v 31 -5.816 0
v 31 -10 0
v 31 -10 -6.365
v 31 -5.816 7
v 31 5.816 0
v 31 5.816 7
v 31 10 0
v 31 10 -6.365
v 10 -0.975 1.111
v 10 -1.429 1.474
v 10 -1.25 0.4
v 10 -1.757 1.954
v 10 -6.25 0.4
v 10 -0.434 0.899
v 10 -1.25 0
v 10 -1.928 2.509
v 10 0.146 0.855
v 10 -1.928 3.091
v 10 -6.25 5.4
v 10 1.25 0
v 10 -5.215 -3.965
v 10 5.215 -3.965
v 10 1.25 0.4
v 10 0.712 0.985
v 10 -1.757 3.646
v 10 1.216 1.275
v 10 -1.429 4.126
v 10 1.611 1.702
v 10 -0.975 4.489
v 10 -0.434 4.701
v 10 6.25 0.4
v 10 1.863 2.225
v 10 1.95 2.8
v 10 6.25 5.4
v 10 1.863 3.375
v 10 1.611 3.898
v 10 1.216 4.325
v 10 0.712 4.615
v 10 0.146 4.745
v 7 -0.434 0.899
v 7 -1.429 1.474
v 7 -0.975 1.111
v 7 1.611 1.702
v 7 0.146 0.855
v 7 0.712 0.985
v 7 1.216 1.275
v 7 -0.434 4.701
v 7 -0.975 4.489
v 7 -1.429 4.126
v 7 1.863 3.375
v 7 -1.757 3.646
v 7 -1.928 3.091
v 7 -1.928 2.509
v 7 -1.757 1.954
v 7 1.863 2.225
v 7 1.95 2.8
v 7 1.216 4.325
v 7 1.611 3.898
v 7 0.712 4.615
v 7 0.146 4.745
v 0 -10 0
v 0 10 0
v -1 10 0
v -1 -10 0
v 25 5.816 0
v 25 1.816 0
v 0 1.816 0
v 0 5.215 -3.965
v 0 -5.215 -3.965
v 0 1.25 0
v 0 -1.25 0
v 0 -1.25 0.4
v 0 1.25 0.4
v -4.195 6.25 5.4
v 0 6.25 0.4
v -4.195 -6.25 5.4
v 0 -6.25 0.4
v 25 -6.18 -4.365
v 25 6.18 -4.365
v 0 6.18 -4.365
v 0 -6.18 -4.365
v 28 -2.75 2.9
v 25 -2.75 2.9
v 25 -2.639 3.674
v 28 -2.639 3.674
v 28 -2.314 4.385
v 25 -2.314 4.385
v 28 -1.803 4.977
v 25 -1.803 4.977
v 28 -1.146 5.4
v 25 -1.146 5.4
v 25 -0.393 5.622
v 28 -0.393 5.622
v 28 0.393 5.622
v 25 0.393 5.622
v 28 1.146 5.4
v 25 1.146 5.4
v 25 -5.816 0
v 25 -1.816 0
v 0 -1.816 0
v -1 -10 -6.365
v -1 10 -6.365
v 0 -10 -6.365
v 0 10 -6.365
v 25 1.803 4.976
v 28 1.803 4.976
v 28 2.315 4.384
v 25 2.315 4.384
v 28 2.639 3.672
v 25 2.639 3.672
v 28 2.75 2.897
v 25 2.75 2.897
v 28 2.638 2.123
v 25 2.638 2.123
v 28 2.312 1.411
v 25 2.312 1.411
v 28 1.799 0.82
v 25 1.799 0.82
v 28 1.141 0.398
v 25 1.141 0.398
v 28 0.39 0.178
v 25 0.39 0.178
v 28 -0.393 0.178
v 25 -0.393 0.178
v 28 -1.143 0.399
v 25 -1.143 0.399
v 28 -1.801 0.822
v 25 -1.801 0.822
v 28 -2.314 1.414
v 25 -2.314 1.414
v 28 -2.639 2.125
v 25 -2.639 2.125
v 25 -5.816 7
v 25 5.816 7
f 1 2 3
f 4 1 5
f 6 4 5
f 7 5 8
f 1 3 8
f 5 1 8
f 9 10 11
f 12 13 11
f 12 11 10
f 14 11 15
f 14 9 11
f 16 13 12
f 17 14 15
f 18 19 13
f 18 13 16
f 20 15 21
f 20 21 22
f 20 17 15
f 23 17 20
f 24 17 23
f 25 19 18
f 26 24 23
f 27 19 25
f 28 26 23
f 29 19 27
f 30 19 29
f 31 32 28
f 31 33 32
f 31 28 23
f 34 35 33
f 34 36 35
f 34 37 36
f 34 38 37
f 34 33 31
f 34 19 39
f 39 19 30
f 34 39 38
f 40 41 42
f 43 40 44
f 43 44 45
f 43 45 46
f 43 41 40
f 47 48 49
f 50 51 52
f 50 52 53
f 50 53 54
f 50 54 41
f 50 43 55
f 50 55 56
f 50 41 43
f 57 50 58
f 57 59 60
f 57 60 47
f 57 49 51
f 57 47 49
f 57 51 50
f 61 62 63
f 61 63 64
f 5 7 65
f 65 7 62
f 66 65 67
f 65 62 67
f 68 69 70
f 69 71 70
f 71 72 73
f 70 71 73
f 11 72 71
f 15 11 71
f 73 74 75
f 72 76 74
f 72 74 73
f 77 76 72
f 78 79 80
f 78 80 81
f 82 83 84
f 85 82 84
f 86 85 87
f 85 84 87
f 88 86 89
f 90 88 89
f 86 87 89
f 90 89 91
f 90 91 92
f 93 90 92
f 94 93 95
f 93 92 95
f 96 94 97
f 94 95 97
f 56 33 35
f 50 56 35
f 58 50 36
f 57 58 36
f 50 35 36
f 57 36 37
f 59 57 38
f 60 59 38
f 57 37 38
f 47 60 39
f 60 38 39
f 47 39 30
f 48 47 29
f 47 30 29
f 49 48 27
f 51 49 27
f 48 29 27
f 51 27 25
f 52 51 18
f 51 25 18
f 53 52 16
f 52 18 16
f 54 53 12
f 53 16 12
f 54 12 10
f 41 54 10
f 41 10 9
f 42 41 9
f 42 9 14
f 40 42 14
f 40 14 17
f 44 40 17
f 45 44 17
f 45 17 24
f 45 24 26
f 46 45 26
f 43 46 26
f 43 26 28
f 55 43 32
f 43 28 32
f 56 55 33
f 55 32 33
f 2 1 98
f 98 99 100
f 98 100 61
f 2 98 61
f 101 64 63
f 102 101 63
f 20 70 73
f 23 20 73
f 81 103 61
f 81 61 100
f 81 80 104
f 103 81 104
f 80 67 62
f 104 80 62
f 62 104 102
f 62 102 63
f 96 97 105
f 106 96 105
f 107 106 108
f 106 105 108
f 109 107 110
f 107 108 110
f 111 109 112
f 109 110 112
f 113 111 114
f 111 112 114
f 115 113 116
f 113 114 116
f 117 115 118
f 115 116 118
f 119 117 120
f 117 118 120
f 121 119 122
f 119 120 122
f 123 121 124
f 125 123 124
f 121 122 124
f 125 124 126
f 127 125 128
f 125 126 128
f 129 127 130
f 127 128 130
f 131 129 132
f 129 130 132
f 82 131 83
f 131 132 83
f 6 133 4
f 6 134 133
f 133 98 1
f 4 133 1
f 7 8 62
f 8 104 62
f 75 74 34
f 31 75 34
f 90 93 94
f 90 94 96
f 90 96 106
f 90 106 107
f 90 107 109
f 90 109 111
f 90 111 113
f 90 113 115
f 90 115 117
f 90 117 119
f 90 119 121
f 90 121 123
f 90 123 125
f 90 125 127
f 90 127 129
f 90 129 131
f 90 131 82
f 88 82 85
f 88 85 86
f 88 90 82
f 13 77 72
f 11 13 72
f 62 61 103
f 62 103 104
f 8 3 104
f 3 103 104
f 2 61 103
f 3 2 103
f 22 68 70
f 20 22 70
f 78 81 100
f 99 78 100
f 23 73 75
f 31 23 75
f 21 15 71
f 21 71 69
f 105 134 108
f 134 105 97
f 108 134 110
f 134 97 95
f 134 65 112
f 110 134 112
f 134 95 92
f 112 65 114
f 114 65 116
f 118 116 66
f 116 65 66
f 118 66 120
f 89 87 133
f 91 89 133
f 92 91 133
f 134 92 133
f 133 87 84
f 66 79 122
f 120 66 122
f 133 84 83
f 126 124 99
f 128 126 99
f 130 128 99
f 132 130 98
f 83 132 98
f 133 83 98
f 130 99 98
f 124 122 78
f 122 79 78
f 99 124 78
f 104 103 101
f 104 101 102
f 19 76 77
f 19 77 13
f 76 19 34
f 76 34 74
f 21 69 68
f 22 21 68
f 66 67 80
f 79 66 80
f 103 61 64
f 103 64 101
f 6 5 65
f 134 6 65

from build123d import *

# Parameters (mm, degrees)
F2_DEPTH  = 25
F3_DEPTH  = 10
F5_DEPTH  = 12.5
F7_DEPTH  = 6
F9_DEPTH  = 7
F11_DEPTH = 3
F12_R     = 1.95
F12_R_2   = 1
F13_DEPTH = 3
F15_DEPTH = 1


# Not quite as in the source:
# - a feature names something its author has since deleted; it is built from what else it names


with BuildPart() as f2:
    # F1 (on Right) → F2 (new body)
    with BuildSketch(Plane.YZ):
        Polygon((10, -6.3646009103), (10, 0), (1.8156854249, 0), (6.1802863352, -4.3646009103), (0, -4.3646009103), (-6.1802863352, -4.3646009103), (-1.8156854249, 0), (-10, 0), (-10, -6.3646009103), (0, -6.3646009103), align=None)
    extrude(amount=F2_DEPTH)

    # F6 (on face) → F7 (join)
    with BuildSketch(Plane.YZ.offset(25)):
        Polygon((-6.1802863352, -4.3646009103), (-1.8156854249, 0), (-10, 0), (-10, -6.3646009103), (10, -6.3646009103), (10, 0), (1.8156854249, 0), (6.1802863352, -4.3646009103), align=None)
        Polygon((1.8156854249, 0), (-1.8156854249, 0), (-6.1802863352, -4.3646009103), (6.1802863352, -4.3646009103), align=None)
    extrude(amount=F7_DEPTH)

    # F8 (on face) → F9 (join)
    with BuildSketch(Plane.XY):
        Polygon((25, 1.8156854249), (25, -1.8156854249), (25, -5.8156854249), (31, -5.8156854249), (31, 5.8156854249), (25, 5.8156854249), align=None)
    extrude(amount=F9_DEPTH)

    # F10 (on face) → F11 (cut)
    with BuildSketch(Plane(origin=(25, 0, 0), x_dir=(0, -1, 0), z_dir=(-1, 0, 0))):
        with BuildLine():
            ThreePointArc((1.1456439237, 5.4), (0, 5.65), (-1.1456439237, 5.4))
            Line((-1.1456439237, 5.4), (1.1456439237, 5.4))
        make_face()
        with BuildLine():
            Line((1.1456439237, 5.4), (-1.1456439237, 5.4))
            ThreePointArc((-1.1456439237, 5.4), (-1.4852574204, 0.585586382), (2.75, 2.9))
            ThreePointArc((2.75, 2.9), (2.314413618, 4.3852574204), (1.1456439237, 5.4))
        make_face()
    extrude(amount=-F11_DEPTH, mode=Mode.SUBTRACT)


with BuildPart() as f3:
    # F1 (on Right) → F3 (new body)
    with BuildSketch(Plane.YZ):
        Polygon((0, -3.9646009103), (5.2146009103, -3.9646009103), (1.25, 0), (1.25, 0.4), (6.25, 0.4), (6.25, 5.4), (0, 5.4), (-6.25, 5.4), (-6.25, 0.4), (-1.25, 0.4), (-1.25, 0), (-5.2146009103, -3.9646009103), align=None)
    extrude(amount=F3_DEPTH)

    # F4 (on face) → F5 (join, through all)
    with BuildSketch(Plane.XZ.offset(6.25)):
        Polygon((-4.1954981559, 5.4), (0, 0.4), (0, 5.4), align=None)
    extrude(amount=-F5_DEPTH)

    # F12 (on face) → F13 (cut)
    with BuildSketch(Plane.YZ.offset(10)):
        with Locations((0, 2.8)):
            Circle(F12_R)
        with Locations((0, 2.8)):
            Circle(F12_R_2, mode=Mode.SUBTRACT)
        with Locations((0, 2.8)):
            Circle(F12_R_2)
    extrude(amount=-F13_DEPTH, mode=Mode.SUBTRACT)


with BuildPart() as f15:
    # F14 (on face) → F15 (new body)
    with BuildSketch(Plane.YZ):
        Polygon((0.1802863352, -0.3646009103), (4.1802863352, -0.3646009103), (4.1802863352, 0), (-10, 0), (-10, -6.3646009103), (0, -6.3646009103), (10, -6.3646009103), (10, -2), (6, -2), (6, -4.3646009103), (0.1802863352, -4.3646009103), align=None)
        Polygon((4.1802863352, 0), (4.1802863352, -0.3646009103), (0.1802863352, -0.3646009103), (0.1802863352, -4.3646009103), (6, -4.3646009103), (6, -2), (10, -2), (10, 0), align=None)
    extrude(amount=-F15_DEPTH)


solid = Compound([f2.part, f3.part, f15.part])
